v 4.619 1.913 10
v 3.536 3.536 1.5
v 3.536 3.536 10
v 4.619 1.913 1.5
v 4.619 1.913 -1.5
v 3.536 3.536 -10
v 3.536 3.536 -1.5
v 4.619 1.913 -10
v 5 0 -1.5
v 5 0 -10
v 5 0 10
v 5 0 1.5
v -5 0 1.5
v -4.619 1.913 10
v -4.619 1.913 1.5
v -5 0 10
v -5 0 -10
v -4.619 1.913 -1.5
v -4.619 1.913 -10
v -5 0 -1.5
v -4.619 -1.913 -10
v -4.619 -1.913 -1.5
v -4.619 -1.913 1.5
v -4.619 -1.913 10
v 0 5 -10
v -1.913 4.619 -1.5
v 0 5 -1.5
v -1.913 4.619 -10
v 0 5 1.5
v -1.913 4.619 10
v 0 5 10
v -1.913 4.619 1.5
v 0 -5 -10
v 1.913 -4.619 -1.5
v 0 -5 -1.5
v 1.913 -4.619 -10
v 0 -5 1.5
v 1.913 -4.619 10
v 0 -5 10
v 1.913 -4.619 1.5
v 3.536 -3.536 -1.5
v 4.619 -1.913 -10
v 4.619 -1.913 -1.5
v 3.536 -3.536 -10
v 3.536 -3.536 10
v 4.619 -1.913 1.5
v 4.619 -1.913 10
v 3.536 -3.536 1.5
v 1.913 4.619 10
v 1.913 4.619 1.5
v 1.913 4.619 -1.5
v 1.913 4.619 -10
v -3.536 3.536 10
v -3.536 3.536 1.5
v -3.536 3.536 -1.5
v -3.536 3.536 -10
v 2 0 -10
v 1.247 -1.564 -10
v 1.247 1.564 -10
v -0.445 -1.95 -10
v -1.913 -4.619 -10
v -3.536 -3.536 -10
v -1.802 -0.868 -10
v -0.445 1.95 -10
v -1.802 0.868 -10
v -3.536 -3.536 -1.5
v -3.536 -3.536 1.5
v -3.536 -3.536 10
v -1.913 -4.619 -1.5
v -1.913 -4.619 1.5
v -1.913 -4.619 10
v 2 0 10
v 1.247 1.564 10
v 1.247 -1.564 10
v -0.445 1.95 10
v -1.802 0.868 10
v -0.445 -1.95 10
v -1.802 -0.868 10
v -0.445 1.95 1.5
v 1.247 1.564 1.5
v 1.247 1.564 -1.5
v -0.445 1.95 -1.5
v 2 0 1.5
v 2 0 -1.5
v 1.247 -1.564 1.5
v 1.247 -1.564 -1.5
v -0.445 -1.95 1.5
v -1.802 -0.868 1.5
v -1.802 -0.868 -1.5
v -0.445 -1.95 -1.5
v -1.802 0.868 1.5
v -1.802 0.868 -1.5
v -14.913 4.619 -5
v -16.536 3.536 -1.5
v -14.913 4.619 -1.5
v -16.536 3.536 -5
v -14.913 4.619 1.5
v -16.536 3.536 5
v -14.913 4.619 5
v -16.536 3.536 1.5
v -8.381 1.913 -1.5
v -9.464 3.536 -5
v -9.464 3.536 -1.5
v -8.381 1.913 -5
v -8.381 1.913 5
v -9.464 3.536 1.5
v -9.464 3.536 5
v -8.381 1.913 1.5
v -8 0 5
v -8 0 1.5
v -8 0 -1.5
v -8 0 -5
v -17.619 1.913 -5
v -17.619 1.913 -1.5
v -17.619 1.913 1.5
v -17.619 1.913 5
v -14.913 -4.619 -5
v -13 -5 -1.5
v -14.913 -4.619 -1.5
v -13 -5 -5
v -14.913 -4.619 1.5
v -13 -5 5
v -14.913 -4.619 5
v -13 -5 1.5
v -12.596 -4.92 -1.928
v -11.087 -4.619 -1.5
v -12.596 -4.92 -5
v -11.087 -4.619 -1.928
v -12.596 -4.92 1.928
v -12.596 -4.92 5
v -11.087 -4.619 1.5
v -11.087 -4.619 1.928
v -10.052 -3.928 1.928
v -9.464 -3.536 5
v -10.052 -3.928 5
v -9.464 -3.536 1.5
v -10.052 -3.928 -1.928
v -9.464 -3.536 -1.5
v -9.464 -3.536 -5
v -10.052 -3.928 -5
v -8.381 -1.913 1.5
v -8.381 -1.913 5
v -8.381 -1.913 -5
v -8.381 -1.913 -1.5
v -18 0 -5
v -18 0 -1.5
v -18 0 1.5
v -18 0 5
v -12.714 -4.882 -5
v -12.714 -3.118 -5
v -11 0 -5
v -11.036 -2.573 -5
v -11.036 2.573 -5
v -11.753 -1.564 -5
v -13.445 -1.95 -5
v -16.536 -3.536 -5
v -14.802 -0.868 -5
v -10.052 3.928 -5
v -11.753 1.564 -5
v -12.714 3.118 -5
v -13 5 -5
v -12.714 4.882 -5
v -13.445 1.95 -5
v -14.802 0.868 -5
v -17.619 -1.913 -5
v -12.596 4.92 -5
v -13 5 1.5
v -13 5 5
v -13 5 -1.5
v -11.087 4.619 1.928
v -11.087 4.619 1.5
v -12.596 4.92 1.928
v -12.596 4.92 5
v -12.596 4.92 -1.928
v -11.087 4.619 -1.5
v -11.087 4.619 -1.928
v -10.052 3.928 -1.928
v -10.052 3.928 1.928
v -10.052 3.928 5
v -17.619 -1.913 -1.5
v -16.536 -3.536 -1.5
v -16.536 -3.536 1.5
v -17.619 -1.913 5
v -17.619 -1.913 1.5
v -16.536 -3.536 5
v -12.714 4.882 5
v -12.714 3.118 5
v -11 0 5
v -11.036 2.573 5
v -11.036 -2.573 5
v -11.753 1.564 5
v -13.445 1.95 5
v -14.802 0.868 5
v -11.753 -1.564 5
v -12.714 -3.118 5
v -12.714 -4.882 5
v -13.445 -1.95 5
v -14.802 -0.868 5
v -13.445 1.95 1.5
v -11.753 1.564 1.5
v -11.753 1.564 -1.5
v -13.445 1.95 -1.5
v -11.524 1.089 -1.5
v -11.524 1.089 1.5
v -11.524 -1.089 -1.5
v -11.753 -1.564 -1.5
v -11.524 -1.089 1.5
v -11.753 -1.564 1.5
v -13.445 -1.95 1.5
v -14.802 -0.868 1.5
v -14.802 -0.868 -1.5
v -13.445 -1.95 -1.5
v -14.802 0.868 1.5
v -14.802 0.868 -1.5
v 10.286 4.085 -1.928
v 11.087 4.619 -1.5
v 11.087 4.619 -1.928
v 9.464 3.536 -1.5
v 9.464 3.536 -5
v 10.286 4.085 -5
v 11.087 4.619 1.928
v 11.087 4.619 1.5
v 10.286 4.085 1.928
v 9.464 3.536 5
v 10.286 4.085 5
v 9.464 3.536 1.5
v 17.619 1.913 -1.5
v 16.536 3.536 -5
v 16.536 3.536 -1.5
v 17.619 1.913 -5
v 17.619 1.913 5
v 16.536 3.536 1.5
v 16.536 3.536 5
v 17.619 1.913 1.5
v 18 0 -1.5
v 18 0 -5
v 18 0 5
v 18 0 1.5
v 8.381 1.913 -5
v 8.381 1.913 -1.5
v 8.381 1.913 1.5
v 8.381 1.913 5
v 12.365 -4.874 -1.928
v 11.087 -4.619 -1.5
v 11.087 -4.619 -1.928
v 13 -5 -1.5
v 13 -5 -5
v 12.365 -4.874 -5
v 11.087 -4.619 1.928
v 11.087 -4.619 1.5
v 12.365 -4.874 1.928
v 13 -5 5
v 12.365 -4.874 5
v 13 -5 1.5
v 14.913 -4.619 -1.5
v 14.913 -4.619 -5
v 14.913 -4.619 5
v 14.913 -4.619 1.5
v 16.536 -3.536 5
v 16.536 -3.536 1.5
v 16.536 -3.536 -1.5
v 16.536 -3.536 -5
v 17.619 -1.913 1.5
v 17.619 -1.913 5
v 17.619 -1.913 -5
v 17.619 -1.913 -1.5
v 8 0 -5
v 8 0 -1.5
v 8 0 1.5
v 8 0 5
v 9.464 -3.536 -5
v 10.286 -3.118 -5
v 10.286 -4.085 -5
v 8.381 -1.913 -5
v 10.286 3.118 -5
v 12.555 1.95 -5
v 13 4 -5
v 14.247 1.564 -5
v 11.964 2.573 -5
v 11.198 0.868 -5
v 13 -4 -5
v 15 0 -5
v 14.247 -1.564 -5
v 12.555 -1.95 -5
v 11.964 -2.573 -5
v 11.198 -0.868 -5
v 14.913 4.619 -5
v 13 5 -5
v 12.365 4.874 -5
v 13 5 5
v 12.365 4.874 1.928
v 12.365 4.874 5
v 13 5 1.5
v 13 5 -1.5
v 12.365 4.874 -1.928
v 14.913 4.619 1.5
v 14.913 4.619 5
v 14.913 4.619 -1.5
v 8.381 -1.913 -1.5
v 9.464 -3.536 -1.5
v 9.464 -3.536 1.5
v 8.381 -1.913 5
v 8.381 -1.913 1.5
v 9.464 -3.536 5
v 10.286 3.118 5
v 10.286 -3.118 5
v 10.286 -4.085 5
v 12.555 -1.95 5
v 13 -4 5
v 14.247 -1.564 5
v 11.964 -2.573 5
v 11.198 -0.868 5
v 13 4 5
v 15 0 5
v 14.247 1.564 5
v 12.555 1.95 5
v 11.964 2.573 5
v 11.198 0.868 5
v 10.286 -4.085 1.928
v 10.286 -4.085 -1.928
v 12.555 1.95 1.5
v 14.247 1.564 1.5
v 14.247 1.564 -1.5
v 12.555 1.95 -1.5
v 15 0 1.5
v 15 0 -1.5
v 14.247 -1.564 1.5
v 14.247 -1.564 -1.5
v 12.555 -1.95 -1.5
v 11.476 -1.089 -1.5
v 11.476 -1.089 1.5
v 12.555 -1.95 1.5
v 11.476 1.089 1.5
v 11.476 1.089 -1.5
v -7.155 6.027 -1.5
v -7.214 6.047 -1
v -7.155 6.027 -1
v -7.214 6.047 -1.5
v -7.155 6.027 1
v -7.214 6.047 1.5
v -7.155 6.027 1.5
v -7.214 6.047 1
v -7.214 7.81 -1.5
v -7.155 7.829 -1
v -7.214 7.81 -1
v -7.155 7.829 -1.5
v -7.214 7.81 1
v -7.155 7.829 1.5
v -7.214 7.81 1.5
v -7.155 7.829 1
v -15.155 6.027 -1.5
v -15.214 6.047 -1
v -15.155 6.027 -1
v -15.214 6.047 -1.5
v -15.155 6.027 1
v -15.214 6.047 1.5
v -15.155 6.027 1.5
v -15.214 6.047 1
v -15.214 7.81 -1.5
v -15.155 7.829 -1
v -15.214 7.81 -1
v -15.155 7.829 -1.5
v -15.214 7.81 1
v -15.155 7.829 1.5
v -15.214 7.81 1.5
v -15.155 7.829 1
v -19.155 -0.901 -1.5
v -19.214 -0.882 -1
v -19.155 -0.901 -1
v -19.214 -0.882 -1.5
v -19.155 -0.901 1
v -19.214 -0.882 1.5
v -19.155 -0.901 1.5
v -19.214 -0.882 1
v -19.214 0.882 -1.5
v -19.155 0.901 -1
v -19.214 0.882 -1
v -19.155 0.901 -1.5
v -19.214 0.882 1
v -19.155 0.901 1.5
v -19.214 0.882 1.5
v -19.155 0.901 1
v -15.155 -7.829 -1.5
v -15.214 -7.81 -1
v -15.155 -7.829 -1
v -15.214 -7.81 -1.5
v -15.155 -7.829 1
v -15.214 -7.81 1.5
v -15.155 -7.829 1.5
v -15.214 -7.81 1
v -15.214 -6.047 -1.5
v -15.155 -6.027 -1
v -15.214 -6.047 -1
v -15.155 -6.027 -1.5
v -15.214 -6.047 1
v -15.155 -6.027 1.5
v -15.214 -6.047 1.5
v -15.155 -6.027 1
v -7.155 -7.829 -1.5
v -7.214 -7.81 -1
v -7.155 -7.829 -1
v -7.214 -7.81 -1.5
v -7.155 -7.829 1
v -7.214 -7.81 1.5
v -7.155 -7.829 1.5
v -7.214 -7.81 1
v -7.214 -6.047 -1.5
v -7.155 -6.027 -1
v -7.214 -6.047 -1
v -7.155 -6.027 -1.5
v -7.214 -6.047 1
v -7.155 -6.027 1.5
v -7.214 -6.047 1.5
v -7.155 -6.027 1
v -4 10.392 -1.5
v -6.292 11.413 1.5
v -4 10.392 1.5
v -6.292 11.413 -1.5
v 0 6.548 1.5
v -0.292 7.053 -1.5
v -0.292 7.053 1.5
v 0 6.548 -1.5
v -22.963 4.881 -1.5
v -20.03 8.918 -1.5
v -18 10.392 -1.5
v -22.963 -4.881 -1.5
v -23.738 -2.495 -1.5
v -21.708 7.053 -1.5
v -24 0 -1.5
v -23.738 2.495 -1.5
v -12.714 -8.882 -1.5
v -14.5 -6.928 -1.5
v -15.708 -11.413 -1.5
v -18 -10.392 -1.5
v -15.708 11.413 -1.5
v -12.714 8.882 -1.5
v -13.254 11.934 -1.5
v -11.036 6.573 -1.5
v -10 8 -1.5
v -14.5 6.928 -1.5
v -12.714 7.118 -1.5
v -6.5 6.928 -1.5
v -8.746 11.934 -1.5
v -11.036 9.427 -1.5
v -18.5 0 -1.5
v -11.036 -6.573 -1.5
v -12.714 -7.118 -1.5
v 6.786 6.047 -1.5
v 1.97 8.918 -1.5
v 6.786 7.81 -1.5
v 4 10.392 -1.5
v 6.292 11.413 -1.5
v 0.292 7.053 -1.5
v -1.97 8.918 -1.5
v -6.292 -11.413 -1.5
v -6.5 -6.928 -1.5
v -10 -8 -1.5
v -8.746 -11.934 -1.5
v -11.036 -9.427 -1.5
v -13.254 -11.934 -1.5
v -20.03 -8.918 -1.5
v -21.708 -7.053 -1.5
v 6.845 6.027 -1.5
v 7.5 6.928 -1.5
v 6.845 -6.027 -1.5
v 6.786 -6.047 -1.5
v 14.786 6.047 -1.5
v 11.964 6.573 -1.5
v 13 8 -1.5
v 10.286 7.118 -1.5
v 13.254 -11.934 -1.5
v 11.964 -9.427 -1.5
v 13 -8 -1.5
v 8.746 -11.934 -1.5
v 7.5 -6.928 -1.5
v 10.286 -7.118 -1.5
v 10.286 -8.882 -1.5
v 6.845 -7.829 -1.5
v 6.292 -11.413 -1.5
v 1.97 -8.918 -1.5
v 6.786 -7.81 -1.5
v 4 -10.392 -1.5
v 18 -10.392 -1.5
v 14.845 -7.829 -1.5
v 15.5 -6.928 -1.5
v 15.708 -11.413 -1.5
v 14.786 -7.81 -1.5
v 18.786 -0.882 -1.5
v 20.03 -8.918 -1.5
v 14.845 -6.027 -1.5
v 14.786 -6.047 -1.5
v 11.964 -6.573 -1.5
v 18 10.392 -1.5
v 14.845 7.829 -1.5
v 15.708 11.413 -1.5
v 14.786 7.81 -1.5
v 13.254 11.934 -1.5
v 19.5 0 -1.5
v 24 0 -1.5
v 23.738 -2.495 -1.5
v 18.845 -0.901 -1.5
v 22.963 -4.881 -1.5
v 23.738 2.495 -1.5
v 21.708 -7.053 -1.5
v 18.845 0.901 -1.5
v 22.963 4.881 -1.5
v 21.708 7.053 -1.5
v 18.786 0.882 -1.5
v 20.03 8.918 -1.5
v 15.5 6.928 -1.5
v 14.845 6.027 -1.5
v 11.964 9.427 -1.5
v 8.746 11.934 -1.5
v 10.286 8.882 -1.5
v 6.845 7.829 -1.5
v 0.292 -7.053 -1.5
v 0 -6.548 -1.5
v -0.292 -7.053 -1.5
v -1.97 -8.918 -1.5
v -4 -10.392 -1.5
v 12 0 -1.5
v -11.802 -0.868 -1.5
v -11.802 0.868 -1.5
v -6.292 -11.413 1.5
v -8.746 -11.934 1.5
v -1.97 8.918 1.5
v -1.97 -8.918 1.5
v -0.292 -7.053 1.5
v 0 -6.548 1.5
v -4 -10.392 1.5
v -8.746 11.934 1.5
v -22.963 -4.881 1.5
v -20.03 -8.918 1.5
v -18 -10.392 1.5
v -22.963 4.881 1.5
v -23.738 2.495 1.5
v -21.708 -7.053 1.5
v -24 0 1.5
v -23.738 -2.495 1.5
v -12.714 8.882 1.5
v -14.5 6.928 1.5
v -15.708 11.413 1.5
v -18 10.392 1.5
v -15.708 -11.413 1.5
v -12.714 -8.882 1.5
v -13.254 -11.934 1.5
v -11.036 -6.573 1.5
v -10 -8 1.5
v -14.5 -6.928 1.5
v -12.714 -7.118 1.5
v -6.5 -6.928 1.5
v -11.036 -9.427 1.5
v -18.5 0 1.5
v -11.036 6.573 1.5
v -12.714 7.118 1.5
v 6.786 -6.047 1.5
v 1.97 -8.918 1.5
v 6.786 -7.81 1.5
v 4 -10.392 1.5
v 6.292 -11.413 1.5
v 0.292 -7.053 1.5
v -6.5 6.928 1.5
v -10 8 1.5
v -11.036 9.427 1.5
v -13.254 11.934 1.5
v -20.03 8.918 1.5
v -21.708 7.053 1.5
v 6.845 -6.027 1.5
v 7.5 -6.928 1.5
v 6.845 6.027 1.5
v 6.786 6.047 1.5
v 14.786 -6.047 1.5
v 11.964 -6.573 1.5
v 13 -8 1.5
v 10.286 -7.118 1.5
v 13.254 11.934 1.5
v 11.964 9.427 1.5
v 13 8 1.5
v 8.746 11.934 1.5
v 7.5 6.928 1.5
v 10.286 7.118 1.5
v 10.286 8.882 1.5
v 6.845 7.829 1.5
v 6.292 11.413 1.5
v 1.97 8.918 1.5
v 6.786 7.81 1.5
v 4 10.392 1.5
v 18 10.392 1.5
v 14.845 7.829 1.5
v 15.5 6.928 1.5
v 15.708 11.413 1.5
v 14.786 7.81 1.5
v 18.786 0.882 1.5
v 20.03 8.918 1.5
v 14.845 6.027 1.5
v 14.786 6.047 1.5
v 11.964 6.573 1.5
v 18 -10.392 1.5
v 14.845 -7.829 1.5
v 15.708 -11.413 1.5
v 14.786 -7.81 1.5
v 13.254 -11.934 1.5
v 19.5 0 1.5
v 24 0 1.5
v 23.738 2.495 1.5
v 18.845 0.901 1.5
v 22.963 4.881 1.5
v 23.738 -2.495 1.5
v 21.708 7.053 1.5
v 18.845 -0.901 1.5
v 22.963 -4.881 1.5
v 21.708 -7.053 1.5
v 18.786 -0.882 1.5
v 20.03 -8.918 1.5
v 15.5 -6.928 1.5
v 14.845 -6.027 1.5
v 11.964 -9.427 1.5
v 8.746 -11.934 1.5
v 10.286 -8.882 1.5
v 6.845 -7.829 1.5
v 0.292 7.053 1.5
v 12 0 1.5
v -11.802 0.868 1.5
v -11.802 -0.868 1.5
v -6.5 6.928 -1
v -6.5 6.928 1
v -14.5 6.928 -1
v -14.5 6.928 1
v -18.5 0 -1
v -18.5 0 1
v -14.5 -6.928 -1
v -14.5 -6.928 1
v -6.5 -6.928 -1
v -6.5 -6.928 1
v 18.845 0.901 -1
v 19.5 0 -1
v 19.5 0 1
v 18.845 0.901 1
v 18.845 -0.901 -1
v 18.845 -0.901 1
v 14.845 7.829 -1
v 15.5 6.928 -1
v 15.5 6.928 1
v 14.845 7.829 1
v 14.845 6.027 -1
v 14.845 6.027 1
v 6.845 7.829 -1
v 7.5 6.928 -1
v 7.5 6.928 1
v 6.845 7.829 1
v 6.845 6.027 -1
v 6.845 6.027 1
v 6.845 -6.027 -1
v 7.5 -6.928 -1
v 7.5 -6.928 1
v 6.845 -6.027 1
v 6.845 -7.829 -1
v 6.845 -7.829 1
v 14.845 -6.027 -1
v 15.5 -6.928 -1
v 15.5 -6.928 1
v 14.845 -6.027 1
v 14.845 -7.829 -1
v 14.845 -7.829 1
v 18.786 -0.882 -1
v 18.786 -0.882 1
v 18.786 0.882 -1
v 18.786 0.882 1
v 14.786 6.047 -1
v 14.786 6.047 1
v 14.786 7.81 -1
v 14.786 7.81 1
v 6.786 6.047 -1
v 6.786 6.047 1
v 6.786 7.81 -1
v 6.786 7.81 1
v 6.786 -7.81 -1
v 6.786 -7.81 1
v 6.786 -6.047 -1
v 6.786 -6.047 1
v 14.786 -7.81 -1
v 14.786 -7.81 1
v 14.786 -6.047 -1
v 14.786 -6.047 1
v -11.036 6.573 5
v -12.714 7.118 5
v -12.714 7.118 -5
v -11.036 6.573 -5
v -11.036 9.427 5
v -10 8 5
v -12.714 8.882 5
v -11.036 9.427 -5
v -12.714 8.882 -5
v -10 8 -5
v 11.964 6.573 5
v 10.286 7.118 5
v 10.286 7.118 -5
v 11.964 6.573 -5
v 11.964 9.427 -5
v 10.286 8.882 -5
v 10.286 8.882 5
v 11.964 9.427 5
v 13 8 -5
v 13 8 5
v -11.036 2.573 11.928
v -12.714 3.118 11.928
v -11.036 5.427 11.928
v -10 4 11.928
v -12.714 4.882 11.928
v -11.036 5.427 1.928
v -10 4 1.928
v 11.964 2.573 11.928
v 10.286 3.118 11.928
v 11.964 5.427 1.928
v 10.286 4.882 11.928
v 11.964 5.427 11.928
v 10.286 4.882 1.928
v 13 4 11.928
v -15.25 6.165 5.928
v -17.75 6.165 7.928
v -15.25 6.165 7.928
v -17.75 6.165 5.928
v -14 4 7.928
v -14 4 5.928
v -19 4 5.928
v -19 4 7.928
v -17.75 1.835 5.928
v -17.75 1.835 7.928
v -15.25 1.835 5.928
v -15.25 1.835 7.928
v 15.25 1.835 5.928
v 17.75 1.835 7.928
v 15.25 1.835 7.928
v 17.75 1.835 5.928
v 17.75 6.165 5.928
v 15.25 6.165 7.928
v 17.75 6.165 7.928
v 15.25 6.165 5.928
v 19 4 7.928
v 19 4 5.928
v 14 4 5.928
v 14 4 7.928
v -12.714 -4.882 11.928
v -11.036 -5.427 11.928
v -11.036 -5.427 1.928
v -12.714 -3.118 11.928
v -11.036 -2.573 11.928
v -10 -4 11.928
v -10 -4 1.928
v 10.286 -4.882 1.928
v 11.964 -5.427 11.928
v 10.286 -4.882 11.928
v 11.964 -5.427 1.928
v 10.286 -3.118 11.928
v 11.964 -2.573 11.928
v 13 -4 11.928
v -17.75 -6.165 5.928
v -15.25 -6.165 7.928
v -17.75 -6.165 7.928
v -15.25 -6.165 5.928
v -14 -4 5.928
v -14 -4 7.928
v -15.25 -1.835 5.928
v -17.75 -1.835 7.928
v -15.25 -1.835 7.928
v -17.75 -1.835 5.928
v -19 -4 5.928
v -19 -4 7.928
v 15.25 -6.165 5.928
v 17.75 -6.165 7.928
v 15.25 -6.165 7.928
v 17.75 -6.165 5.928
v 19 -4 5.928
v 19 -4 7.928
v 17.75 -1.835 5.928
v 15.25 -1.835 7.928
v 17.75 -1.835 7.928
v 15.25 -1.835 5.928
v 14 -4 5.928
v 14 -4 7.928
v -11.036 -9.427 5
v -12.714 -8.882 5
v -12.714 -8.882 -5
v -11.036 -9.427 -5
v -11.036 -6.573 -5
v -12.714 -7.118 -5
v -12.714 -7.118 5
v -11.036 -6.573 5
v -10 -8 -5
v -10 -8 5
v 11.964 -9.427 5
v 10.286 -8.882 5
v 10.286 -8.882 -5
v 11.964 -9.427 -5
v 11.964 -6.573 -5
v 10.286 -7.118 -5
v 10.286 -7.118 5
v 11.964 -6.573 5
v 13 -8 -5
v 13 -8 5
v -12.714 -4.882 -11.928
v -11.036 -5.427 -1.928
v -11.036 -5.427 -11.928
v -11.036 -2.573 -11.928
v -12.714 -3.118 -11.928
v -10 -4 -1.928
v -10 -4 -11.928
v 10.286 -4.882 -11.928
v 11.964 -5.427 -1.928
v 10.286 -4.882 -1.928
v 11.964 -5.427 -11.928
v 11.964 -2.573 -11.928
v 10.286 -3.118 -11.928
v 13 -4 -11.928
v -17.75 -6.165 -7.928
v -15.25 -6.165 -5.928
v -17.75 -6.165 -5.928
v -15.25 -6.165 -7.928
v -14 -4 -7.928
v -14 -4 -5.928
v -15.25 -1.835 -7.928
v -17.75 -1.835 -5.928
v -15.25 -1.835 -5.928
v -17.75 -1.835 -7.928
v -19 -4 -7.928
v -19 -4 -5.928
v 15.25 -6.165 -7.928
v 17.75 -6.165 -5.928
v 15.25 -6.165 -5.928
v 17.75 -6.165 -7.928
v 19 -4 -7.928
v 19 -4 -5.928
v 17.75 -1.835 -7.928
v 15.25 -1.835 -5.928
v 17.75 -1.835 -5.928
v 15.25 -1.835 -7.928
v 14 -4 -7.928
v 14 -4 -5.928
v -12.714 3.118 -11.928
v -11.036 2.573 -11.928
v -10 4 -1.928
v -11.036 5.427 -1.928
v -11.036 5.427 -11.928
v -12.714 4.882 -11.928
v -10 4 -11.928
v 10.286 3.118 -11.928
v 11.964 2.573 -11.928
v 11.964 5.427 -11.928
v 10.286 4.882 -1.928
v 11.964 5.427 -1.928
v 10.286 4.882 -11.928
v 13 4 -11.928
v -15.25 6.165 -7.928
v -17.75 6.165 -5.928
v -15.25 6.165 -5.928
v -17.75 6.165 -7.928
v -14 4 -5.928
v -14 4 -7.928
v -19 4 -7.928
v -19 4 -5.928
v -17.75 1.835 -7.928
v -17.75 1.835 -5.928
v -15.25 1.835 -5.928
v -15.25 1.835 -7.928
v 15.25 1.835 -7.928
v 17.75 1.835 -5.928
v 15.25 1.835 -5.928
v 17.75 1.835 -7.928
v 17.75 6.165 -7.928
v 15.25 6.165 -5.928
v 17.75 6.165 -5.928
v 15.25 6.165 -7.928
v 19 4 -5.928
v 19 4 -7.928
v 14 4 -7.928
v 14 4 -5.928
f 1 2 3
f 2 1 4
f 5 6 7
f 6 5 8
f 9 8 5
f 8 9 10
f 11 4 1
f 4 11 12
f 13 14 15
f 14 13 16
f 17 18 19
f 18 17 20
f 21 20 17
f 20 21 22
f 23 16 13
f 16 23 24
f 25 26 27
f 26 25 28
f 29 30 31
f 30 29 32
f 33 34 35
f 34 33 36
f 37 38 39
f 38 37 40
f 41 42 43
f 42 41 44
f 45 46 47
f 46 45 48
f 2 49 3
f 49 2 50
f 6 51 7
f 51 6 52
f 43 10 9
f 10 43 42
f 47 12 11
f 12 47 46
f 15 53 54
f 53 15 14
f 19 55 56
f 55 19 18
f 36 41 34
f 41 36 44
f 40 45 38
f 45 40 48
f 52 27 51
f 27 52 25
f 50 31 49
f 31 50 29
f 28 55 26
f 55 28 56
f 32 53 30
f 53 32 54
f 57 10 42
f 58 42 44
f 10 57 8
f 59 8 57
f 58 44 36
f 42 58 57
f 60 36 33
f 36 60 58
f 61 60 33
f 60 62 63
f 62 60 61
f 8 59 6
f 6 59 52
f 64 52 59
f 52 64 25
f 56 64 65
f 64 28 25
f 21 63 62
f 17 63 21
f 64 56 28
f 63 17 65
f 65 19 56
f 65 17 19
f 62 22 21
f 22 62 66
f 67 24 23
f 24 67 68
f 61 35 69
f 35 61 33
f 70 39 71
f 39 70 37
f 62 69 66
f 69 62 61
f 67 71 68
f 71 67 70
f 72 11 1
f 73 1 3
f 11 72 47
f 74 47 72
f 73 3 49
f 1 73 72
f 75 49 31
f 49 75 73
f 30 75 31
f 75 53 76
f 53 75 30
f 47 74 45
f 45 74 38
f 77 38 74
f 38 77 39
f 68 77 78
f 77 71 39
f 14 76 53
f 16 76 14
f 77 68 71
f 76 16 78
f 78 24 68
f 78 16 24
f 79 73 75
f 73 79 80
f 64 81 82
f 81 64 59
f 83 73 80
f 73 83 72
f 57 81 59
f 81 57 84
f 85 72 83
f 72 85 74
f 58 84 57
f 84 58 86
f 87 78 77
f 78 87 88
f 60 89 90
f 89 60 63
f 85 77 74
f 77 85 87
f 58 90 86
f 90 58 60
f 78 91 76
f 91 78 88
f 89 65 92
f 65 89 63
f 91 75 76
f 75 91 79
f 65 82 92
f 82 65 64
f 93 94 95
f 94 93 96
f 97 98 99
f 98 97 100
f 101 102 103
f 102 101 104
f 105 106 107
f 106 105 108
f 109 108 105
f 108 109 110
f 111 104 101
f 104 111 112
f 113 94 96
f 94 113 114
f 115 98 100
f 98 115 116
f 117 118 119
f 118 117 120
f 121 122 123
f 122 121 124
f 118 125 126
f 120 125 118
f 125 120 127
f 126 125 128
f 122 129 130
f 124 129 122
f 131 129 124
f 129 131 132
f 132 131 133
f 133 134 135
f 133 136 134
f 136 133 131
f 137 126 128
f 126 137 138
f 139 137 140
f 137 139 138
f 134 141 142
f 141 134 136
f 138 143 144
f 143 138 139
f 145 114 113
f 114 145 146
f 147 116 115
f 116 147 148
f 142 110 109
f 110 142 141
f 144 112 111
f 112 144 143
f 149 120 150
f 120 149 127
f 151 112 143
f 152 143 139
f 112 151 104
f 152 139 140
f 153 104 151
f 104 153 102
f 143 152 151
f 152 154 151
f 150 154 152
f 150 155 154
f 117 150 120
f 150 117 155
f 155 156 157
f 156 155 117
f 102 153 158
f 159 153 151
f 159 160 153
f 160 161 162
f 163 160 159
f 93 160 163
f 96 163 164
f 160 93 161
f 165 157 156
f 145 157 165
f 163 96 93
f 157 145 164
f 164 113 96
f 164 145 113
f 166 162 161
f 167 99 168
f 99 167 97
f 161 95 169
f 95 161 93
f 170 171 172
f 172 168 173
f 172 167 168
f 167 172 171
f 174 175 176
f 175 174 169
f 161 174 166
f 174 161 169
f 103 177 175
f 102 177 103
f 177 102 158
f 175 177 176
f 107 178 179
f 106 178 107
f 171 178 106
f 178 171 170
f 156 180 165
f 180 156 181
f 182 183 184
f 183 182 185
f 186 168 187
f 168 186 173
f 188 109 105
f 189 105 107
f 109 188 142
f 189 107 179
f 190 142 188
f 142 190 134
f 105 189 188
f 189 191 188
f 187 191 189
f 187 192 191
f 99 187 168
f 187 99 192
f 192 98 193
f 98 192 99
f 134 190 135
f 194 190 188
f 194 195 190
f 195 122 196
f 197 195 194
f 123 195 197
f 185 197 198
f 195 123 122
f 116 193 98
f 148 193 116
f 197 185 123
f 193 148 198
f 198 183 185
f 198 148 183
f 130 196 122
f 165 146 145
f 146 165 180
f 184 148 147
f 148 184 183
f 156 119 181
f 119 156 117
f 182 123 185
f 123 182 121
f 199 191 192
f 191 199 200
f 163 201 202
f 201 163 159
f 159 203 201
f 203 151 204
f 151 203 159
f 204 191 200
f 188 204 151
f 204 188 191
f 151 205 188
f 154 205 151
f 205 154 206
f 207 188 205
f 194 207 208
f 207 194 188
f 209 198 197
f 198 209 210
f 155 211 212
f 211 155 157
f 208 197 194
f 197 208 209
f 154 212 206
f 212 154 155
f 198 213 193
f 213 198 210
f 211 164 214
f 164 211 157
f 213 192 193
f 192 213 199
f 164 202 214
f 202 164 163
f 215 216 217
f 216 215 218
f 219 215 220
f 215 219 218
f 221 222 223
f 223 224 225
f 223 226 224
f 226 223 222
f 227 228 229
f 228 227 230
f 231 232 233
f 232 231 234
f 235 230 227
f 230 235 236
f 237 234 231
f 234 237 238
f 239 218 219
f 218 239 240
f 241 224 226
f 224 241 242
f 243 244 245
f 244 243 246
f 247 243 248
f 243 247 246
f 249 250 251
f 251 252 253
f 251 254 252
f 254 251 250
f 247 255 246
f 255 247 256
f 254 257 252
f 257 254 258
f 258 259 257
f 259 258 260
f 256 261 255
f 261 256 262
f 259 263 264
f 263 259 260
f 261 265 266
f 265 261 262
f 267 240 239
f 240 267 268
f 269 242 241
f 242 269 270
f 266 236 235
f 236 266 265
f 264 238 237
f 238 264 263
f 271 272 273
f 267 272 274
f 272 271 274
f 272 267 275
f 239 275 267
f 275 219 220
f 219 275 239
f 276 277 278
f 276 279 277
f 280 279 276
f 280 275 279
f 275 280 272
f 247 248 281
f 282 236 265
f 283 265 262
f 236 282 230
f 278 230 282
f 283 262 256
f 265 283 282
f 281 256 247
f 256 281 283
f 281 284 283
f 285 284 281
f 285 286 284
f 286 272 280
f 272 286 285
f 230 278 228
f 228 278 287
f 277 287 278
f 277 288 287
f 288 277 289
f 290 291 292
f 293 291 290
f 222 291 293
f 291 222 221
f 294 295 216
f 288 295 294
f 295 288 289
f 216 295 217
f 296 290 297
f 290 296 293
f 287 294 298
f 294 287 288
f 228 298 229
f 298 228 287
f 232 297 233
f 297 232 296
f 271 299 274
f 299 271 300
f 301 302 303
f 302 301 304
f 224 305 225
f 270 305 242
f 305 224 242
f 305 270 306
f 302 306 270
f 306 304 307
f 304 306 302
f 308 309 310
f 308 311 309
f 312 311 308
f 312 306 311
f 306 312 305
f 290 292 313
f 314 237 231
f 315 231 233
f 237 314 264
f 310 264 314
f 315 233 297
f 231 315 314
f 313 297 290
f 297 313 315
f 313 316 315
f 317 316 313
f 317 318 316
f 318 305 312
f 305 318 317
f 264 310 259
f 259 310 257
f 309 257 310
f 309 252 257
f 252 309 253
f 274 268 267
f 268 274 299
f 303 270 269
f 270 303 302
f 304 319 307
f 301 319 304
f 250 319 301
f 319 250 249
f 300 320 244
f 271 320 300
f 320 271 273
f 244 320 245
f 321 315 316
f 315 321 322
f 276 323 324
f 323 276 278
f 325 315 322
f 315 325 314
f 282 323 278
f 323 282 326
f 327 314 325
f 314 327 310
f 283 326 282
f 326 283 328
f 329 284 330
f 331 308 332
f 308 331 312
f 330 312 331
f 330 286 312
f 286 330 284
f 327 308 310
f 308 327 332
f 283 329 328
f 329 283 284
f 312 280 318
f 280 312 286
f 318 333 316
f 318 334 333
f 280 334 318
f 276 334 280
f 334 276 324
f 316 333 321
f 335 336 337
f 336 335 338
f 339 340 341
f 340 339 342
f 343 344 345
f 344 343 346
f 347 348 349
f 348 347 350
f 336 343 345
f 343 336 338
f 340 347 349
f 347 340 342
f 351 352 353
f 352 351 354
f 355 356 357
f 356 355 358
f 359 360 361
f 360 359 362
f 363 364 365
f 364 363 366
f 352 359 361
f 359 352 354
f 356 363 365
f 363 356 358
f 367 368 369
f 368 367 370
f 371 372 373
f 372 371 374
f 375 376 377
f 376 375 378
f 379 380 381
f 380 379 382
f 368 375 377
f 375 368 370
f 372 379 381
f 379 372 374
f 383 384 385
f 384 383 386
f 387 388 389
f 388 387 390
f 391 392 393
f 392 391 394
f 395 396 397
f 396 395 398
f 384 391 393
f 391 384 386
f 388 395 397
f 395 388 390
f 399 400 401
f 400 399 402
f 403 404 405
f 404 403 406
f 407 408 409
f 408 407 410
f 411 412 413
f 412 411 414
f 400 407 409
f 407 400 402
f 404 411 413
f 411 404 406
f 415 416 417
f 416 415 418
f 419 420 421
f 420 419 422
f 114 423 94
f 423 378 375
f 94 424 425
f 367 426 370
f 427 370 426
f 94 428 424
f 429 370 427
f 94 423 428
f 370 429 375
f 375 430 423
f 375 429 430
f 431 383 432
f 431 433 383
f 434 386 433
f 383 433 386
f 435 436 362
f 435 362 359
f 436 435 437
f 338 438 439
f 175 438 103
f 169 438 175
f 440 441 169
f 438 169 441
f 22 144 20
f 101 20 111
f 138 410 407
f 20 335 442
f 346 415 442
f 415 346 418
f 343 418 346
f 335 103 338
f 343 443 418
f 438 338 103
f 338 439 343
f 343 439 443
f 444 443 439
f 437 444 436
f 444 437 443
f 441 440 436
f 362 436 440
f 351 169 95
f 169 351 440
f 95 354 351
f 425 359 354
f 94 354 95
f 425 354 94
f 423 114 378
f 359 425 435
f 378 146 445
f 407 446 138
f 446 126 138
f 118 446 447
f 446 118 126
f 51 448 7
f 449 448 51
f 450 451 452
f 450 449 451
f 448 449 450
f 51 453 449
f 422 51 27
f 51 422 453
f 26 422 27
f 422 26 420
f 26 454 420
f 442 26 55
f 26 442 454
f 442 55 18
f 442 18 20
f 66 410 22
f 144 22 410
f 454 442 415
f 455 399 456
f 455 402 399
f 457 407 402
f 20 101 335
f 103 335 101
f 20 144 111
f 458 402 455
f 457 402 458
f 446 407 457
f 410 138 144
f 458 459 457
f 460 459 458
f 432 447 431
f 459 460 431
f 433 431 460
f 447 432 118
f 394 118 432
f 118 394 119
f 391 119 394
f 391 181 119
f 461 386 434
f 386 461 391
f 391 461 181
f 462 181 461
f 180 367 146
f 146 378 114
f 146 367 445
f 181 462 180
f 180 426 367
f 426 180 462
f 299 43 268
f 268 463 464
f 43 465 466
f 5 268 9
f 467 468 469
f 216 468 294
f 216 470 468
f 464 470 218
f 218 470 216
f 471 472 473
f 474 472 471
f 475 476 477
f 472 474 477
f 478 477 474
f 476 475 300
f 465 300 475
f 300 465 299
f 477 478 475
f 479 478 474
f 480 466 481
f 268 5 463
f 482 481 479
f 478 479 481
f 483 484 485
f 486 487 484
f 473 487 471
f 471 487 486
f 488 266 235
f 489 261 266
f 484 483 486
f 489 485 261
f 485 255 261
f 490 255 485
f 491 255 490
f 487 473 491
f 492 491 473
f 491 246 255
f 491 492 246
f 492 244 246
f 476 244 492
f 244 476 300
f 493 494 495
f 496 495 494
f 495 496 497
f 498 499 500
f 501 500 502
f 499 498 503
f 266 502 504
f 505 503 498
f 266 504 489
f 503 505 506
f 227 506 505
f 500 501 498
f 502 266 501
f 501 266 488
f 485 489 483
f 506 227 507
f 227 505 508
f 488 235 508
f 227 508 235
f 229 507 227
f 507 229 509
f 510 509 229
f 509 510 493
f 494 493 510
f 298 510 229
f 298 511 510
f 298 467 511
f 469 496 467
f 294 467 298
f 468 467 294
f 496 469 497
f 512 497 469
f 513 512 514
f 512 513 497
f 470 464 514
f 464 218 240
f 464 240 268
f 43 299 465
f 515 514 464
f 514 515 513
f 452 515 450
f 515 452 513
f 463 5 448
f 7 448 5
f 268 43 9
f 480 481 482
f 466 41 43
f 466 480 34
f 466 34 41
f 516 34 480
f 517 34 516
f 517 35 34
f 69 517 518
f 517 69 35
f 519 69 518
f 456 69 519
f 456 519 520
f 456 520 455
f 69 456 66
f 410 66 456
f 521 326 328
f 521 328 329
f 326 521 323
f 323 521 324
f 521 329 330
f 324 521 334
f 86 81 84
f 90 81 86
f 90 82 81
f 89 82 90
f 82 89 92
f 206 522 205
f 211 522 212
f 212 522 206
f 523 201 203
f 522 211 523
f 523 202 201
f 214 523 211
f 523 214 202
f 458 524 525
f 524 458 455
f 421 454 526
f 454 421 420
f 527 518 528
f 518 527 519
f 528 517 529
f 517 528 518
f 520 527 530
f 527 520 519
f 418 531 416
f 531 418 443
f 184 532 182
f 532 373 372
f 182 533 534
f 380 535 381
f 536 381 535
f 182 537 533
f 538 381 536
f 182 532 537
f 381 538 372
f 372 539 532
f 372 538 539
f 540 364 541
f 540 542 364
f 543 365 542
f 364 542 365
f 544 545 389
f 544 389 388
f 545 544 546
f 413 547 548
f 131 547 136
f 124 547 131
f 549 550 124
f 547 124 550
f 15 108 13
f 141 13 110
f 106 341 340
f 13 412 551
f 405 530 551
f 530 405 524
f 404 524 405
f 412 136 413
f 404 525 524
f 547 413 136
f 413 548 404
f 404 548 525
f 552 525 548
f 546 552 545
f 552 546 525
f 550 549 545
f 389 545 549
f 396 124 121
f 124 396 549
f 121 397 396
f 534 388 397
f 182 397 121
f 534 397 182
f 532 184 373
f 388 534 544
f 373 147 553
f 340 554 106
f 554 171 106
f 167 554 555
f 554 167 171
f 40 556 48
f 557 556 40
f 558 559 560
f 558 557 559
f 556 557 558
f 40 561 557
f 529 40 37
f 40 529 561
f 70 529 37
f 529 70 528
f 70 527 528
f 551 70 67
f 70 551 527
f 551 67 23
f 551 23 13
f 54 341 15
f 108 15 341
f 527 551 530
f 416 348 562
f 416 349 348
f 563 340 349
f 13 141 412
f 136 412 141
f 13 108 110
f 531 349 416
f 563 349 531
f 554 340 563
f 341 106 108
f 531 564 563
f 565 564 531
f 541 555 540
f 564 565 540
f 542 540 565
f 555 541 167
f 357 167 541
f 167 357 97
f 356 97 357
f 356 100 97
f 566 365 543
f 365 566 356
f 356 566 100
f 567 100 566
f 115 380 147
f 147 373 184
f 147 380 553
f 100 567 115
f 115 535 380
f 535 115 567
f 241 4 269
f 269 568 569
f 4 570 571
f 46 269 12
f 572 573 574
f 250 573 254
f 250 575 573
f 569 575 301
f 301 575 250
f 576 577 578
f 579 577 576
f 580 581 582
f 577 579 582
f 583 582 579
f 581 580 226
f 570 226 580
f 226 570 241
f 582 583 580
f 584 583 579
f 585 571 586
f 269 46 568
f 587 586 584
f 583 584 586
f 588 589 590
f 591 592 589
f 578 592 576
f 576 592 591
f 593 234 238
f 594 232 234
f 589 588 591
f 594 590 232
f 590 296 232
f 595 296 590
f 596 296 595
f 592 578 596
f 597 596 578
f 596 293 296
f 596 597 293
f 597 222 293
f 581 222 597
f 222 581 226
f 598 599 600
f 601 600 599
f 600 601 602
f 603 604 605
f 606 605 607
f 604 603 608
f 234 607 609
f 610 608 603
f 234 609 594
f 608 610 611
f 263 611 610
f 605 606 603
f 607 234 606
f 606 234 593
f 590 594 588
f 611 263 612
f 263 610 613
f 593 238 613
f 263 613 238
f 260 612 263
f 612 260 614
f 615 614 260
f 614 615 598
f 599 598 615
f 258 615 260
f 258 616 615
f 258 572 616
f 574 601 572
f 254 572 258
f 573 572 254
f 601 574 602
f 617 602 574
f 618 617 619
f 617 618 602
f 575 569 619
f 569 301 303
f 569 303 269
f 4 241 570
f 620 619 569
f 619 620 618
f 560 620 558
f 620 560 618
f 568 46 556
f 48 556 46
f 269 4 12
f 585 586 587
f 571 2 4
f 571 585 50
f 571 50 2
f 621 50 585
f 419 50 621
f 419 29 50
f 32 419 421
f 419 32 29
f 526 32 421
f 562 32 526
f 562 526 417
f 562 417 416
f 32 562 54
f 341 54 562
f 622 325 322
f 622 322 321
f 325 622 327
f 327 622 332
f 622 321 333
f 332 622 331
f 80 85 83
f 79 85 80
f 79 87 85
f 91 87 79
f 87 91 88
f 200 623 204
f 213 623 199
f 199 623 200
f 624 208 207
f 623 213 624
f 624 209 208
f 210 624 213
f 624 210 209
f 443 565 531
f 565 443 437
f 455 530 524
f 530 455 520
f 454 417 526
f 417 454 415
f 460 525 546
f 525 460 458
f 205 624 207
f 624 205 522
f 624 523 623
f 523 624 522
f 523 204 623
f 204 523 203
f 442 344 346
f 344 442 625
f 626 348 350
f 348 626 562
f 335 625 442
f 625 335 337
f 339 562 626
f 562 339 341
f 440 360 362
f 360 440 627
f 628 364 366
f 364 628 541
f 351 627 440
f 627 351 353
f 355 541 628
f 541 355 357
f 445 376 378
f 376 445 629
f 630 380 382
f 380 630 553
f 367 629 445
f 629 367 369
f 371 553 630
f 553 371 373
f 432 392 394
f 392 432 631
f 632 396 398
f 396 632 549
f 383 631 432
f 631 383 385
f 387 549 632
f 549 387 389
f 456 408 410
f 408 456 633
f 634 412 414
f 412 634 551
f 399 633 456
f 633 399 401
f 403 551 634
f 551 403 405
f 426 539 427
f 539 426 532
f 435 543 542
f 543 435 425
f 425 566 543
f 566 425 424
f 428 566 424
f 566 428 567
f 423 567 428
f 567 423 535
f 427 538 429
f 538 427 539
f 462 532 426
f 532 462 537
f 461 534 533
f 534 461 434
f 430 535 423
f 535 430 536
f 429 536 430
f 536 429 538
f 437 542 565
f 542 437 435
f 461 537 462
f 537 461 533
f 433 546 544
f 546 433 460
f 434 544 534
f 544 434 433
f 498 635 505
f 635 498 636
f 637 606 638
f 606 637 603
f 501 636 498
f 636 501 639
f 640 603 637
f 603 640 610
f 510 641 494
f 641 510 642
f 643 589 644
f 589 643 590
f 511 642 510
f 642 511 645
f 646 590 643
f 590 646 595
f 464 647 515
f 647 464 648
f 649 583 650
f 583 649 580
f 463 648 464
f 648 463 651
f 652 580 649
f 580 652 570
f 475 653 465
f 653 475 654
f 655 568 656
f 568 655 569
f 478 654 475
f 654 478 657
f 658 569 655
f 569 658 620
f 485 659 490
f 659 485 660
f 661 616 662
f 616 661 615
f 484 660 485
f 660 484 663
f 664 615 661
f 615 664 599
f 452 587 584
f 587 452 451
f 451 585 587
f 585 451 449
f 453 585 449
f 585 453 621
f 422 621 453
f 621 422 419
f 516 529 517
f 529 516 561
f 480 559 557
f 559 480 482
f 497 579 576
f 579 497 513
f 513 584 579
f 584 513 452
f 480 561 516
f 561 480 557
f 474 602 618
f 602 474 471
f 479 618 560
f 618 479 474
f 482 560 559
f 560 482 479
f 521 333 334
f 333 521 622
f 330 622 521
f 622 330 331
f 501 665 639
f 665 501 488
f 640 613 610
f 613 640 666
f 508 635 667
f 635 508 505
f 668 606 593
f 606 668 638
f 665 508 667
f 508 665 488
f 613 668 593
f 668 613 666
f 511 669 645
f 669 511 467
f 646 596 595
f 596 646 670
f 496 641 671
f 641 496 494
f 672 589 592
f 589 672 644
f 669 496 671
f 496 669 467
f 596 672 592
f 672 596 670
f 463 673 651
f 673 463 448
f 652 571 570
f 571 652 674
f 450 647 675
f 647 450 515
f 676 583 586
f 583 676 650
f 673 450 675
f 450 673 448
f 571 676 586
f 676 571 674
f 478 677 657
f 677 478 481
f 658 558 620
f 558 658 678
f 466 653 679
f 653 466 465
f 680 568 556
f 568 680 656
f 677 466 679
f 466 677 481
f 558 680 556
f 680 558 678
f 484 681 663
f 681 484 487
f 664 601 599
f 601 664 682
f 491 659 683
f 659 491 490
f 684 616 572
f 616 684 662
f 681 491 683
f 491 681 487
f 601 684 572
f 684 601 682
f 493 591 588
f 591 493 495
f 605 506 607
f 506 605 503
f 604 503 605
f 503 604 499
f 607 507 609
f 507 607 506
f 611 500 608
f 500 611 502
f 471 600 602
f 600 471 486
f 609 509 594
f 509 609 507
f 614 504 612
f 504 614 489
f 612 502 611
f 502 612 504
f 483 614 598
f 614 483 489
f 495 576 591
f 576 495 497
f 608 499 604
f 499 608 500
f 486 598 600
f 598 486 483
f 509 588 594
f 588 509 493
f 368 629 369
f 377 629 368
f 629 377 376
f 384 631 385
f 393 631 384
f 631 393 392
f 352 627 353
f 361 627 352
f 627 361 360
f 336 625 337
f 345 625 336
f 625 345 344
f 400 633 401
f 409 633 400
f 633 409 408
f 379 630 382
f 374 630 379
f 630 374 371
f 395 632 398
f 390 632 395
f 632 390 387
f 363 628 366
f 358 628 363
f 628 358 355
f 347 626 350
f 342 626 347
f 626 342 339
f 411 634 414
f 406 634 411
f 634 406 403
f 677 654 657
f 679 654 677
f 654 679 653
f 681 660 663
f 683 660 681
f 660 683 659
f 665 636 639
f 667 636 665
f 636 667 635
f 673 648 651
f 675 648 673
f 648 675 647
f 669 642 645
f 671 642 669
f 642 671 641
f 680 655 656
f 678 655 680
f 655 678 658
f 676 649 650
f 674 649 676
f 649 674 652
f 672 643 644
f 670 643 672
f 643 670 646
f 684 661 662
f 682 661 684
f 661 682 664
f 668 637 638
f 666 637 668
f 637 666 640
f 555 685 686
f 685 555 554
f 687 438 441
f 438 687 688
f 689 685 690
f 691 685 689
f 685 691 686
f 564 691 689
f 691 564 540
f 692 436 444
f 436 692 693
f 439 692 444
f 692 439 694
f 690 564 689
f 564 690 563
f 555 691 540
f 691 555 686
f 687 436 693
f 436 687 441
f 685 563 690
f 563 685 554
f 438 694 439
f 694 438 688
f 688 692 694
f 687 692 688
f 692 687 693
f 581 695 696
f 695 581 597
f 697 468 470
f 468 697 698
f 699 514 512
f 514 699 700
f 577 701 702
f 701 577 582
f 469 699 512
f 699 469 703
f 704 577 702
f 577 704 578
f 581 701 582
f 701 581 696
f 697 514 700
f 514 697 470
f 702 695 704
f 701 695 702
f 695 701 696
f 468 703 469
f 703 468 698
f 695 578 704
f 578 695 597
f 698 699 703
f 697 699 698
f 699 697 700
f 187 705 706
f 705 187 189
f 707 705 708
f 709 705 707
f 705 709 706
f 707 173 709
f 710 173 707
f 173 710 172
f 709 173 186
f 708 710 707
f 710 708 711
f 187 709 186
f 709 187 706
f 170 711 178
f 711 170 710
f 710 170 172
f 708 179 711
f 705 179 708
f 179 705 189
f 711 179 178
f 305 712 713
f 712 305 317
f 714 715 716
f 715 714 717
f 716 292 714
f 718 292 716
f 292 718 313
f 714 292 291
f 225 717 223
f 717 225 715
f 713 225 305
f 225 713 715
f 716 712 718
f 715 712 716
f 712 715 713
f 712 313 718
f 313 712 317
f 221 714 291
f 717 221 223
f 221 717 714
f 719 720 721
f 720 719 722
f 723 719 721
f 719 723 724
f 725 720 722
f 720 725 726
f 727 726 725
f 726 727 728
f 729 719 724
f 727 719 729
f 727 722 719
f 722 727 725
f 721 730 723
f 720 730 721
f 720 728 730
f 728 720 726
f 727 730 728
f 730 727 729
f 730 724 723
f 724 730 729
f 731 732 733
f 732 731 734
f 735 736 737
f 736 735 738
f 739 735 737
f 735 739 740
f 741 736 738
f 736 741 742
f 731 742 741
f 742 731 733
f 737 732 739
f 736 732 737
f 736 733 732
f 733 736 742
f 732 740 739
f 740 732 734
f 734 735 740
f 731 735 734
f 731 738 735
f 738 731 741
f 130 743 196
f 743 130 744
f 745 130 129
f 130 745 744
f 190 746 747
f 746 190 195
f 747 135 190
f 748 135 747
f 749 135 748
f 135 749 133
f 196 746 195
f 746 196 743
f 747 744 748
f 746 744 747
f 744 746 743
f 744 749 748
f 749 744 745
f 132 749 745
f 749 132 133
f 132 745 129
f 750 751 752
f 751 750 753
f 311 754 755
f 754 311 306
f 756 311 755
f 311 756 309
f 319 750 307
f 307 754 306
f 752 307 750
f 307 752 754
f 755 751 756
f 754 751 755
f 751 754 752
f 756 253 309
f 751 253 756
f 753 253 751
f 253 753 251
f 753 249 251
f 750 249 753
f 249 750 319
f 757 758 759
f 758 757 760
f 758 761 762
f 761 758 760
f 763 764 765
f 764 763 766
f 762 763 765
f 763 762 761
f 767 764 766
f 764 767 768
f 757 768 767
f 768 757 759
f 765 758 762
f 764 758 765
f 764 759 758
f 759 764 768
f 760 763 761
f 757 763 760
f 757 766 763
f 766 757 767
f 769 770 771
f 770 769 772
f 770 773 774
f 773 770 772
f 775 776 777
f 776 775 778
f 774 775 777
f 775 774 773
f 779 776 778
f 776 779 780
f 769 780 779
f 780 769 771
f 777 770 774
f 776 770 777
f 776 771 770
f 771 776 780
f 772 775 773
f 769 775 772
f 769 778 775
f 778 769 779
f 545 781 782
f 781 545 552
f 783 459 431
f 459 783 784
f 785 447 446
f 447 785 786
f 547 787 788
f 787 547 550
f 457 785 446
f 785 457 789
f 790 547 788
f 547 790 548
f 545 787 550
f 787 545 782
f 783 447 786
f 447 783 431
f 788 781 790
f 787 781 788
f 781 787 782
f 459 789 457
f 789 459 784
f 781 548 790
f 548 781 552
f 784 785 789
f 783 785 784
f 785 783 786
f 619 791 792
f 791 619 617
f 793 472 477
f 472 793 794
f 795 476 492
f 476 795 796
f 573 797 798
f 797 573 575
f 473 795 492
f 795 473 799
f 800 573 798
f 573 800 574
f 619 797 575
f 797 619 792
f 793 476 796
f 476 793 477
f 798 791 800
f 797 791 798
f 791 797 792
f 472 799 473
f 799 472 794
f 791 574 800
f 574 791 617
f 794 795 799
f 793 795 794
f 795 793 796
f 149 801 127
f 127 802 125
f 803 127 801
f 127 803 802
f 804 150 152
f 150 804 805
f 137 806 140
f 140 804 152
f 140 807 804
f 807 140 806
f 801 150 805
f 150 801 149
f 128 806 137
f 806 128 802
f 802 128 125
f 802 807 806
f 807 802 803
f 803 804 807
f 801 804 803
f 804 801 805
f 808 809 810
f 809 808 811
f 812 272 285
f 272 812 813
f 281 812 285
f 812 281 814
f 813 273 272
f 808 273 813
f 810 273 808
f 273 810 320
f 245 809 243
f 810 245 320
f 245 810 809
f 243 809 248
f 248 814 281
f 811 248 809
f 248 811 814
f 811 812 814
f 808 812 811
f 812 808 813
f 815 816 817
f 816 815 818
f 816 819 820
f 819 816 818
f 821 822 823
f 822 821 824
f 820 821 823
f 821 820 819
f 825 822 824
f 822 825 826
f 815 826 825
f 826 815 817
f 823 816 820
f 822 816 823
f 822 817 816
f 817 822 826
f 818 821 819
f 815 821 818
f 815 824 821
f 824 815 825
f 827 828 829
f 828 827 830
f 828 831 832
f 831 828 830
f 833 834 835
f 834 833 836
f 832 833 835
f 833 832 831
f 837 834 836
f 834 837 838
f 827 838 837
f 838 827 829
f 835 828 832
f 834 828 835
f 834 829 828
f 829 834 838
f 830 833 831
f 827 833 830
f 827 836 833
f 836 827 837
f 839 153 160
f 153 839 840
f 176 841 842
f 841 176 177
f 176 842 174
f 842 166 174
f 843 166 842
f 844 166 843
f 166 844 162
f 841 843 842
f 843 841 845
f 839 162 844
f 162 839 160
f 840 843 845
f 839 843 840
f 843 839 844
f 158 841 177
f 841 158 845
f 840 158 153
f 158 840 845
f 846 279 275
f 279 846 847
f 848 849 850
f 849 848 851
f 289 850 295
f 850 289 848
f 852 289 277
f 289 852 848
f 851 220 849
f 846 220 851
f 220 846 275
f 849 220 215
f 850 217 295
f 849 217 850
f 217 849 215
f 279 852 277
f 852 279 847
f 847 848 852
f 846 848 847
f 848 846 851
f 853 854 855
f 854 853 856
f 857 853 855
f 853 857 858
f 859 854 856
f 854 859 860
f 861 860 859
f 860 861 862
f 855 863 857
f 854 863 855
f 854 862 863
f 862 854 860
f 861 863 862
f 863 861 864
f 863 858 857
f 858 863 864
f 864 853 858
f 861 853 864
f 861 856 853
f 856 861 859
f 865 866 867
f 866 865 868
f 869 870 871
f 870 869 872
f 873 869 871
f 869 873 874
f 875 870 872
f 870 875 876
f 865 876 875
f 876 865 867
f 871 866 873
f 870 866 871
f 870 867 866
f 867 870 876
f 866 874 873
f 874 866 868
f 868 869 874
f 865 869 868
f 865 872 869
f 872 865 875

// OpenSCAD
//start

// Parameters
shaft_radius = 5;
shaft_length = 20;
flange_radius = 12;
flange_thickness = 3;
spacer_radius = 10;
spacer_thickness = 2;
bolt_radius = 1.5;
bolt_length = 10;
nut_radius = 2.5;
nut_thickness = 2;
hole_radius = 2;
bolt_spacing = 8;
num_bolts = 6;

// Function to create a shaft with a central hole
module shaft(length, radius) {
    difference() {
        cylinder(h=length, r=radius, center=true);
        cylinder(h=length+2, r=hole_radius, center=true);
    }
}

// Function to create a flange plate with bolt holes
module flange_plate(radius, thickness) {
    difference() {
        cylinder(h=thickness, r=radius, center=true);
        cylinder(h=thickness+2, r=hole_radius, center=true);
        for (i = [0:num_bolts-1]) {
            angle = i * 360 / num_bolts;
            translate([bolt_spacing * cos(angle), bolt_spacing * sin(angle), 0])
                cylinder(h=thickness+2, r=bolt_radius, center=true);
        }
    }
}

// Function to create a spacer ring
module spacer_ring(radius, thickness) {
    difference() {
        cylinder(h=thickness, r=radius, center=true);
        cylinder(h=thickness+2, r=hole_radius, center=true);
    }
}

// Function to create a bolt
module bolt(length, radius) {
    cylinder(h=length, r=radius, center=true);
}

// Function to create a nut
module nut(radius, thickness) {
    cylinder(h=thickness, r=radius, center=true, $fn=6);
}

// Assembly
module flexible_coupling() {
    // Central shaft
    shaft(shaft_length, shaft_radius);

    // Left outer shaft
    translate([-shaft_length/2 - flange_thickness, 0, 0])
        shaft(shaft_length/2, shaft_radius);

    // Right outer shaft
    translate([shaft_length/2 + flange_thickness, 0, 0])
        shaft(shaft_length/2, shaft_radius);

    // Left flange plates
    translate([-shaft_length/2, 0, 0])
        flange_plate(flange_radius, flange_thickness);
    translate([-shaft_length/2 - spacer_thickness, 0, 0])
        flange_plate(flange_radius, flange_thickness);

    // Right flange plates
    translate([shaft_length/2, 0, 0])
        flange_plate(flange_radius, flange_thickness);
    translate([shaft_length/2 + spacer_thickness, 0, 0])
        flange_plate(flange_radius, flange_thickness);

    // Spacer rings
    translate([-shaft_length/2 - flange_thickness/2, 0, 0])
        spacer_ring(spacer_radius, spacer_thickness);
    translate([shaft_length/2 + flange_thickness/2, 0, 0])
        spacer_ring(spacer_radius, spacer_thickness);

    // Bolts and nuts
    for (i = [0:num_bolts-1]) {
        angle = i * 360 / num_bolts;
        translate([-shaft_length/2 - flange_thickness/2, bolt_spacing * cos(angle), bolt_spacing * sin(angle)])
            bolt(bolt_length, bolt_radius);
        translate([shaft_length/2 + flange_thickness/2, bolt_spacing * cos(angle), bolt_spacing * sin(angle)])
            bolt(bolt_length, bolt_radius);

        translate([-shaft_length/2 - flange_thickness/2 - bolt_length/2, bolt_spacing * cos(angle), bolt_spacing * sin(angle)])
            nut(nut_radius, nut_thickness);
        translate([shaft_length/2 + flange_thickness/2 + bolt_length/2, bolt_spacing * cos(angle), bolt_spacing * sin(angle)])
            nut(nut_radius, nut_thickness);
    }
}

// Render the model
flexible_coupling();
